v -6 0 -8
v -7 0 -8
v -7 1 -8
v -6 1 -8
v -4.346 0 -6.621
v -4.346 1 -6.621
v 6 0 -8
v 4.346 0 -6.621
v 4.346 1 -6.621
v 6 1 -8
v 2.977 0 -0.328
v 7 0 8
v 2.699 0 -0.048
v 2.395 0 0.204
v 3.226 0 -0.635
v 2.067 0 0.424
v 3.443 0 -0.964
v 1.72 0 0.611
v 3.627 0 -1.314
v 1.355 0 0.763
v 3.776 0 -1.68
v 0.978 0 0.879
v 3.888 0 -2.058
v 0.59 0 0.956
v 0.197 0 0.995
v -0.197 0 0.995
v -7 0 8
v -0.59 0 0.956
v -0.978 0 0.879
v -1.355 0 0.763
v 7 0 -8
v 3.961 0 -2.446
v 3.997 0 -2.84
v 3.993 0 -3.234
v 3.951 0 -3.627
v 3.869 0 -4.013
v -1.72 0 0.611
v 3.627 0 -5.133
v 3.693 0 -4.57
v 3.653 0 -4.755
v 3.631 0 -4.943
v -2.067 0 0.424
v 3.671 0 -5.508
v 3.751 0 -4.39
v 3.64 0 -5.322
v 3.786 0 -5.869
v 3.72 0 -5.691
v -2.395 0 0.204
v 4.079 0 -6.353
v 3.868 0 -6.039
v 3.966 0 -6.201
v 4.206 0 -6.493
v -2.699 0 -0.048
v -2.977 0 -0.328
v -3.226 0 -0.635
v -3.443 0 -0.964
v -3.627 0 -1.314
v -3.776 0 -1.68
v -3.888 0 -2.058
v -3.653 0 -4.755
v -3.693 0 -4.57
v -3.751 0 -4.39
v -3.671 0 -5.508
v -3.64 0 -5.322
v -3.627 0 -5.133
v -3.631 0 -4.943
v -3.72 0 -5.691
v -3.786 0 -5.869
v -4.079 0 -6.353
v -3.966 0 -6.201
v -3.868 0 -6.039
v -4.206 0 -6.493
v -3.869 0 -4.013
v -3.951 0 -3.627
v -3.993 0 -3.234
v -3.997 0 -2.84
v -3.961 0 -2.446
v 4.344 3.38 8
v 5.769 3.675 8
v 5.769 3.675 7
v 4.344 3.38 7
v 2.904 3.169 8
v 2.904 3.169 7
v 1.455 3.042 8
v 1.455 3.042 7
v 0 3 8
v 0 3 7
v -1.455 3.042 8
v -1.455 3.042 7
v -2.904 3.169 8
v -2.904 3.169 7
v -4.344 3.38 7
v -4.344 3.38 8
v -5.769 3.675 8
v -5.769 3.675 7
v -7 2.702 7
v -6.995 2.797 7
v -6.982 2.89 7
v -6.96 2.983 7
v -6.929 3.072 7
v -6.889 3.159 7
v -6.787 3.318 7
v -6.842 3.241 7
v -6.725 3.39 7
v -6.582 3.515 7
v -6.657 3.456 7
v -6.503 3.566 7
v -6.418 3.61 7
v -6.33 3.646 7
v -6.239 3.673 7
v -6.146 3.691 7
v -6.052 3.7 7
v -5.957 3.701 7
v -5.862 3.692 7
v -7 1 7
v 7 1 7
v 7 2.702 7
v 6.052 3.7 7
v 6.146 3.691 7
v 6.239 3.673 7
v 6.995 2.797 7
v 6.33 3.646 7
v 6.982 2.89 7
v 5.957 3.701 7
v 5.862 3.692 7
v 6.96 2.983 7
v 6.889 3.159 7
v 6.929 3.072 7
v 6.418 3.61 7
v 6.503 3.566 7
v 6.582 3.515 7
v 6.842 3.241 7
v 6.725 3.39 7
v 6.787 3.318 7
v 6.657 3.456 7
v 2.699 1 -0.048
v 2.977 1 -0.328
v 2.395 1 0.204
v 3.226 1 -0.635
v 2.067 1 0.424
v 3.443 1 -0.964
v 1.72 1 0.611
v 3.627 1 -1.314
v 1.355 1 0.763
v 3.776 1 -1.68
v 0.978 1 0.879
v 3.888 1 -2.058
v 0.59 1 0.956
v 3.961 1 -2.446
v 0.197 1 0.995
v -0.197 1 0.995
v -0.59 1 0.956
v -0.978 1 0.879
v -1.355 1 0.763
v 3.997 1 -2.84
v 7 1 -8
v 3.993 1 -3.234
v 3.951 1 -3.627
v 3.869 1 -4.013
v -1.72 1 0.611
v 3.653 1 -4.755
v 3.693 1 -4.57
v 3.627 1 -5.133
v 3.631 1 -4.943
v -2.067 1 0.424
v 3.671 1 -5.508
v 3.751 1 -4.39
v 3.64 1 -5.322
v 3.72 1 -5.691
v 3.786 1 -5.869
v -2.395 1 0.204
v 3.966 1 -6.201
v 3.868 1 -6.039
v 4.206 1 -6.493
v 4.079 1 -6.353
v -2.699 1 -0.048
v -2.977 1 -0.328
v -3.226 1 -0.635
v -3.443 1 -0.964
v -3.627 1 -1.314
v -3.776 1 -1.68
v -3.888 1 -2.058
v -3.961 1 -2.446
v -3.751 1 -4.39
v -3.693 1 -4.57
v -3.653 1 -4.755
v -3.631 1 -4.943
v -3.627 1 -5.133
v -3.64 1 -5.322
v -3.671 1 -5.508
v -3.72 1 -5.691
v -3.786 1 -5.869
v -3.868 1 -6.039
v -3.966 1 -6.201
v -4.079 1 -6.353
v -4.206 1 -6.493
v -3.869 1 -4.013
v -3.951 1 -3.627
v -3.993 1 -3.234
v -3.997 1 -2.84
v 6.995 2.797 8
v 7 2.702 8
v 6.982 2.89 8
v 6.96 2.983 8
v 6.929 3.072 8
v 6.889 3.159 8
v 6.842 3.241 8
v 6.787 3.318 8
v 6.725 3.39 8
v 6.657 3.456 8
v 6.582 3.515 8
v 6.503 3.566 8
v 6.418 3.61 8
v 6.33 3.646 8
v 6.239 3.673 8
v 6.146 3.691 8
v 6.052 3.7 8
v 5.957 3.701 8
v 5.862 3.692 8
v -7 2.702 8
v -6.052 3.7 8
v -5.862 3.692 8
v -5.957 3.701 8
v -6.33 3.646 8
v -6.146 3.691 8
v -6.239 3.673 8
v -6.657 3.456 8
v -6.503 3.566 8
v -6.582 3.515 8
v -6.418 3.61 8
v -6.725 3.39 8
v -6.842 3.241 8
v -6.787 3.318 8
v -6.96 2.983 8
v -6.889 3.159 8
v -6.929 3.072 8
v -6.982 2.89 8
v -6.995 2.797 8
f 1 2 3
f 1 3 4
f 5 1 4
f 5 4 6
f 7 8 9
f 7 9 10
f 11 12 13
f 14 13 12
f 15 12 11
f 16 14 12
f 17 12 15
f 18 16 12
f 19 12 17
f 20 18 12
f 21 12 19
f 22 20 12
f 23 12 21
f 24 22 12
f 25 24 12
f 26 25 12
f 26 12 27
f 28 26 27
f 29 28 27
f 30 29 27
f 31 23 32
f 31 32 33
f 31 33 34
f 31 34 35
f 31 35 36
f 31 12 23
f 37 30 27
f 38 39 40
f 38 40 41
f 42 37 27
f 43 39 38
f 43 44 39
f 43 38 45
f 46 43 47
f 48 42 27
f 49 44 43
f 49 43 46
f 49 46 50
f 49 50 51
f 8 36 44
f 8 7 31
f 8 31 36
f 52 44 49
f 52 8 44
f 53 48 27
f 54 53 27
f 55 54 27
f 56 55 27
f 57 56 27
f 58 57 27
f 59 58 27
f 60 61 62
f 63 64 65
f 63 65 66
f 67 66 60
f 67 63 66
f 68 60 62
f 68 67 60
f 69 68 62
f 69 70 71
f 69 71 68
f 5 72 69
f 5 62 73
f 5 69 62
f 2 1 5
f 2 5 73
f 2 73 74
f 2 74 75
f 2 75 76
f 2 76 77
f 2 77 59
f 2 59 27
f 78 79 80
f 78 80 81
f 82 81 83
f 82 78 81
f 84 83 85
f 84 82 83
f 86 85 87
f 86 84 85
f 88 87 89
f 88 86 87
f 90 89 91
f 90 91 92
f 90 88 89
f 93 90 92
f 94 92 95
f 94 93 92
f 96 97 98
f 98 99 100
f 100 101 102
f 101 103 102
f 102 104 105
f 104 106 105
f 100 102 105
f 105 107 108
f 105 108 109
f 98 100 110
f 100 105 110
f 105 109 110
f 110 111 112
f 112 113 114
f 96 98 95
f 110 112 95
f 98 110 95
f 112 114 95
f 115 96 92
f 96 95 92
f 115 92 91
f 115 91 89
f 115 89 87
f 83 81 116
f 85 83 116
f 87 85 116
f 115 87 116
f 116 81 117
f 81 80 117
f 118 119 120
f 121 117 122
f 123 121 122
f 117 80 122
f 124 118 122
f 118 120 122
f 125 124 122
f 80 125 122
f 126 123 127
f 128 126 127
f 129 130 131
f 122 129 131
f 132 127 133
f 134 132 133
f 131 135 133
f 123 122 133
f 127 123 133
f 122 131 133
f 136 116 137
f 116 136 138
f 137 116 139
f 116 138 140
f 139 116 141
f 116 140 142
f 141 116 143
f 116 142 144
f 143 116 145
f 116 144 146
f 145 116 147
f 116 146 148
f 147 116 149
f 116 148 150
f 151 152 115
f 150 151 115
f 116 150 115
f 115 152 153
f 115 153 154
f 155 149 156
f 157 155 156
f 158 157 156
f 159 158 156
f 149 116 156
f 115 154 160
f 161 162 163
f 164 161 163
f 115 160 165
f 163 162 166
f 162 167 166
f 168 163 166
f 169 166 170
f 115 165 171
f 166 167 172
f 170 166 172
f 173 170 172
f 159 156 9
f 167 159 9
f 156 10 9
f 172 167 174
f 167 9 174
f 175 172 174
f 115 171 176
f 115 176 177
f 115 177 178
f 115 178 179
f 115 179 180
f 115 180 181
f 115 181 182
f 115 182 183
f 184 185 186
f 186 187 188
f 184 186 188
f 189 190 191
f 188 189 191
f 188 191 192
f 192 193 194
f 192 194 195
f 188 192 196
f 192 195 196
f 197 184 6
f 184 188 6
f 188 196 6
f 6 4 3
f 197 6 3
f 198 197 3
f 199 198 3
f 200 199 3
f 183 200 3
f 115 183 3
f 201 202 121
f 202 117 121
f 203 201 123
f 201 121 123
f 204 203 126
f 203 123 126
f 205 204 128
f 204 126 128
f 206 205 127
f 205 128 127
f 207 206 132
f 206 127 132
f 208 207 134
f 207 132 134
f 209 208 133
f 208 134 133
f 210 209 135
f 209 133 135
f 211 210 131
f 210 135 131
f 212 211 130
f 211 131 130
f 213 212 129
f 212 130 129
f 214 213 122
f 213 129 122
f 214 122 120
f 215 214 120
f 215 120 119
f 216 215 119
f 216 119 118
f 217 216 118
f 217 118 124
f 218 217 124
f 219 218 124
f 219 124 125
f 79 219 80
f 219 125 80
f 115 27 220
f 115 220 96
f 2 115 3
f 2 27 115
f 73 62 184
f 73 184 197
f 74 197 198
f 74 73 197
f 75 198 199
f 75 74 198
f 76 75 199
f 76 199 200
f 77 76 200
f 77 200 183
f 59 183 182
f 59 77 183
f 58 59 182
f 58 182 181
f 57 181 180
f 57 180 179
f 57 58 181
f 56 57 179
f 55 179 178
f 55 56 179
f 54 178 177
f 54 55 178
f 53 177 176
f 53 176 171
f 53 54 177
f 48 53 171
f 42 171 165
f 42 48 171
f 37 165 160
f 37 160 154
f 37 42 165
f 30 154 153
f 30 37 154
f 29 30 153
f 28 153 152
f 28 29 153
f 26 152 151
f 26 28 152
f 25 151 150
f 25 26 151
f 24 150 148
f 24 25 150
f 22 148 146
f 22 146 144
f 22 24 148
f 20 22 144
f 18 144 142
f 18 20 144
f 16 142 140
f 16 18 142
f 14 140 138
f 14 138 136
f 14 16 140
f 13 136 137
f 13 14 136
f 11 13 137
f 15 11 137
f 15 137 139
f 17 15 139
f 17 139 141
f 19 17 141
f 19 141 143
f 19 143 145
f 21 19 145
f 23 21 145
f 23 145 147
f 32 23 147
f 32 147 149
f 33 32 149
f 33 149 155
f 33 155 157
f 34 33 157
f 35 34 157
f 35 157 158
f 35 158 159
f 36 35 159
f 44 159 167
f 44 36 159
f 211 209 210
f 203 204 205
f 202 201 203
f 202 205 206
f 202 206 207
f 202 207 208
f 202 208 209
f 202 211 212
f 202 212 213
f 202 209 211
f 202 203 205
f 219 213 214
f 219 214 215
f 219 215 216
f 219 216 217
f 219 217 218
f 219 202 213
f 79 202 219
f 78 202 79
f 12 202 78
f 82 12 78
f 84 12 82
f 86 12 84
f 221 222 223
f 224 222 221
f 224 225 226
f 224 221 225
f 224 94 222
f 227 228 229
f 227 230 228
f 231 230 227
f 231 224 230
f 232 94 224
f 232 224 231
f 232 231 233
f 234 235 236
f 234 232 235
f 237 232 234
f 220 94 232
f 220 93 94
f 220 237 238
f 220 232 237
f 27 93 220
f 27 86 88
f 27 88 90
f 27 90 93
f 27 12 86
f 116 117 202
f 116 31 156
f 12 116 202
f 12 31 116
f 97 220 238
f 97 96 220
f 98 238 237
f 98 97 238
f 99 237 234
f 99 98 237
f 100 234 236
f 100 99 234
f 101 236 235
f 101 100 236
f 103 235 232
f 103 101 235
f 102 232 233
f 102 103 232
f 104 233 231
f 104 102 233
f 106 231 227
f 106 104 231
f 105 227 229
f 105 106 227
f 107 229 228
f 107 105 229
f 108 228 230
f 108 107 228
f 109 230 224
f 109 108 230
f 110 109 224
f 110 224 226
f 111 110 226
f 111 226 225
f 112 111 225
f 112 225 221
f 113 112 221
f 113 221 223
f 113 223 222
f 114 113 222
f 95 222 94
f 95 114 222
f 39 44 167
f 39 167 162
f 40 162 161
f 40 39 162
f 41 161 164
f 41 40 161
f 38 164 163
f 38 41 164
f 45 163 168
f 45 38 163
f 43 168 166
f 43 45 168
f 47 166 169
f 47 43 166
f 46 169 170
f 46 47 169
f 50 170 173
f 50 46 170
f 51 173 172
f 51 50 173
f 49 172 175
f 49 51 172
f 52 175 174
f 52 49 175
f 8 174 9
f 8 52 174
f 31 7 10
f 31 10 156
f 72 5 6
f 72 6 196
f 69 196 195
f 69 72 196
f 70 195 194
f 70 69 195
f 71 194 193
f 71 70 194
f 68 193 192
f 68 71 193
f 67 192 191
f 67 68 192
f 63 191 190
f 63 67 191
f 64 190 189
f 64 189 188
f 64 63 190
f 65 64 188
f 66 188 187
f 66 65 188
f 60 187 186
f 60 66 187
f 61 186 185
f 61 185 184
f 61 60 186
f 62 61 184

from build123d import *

# Parameters (mm, degrees)
EXTRUDE1_DEPTH = 1
EXTRUDE2_DEPTH = 1
FILLET1_R      = 1


with BuildPart() as part:
    # Sketch1 → Extrude1 (new body)
    with BuildSketch(Plane(origin=(0, 0, 0), x_dir=(1, 0, 0), z_dir=(0, 1, 0))):
        with BuildLine():
            Line((-7, 8), (-6, 8))
            Line((-6, 8), (-4.34571581, 6.621429842))
            ThreePointArc((-4.34571581, 6.621429842), (-3.693602337, 5.600266108), (-3.750723073, 4.389991522))
            ThreePointArc((-3.750723073, 4.389991522), (0, -1), (3.750723073, 4.389991522))
            ThreePointArc((3.750723073, 4.389991522), (3.693602337, 5.600266108), (4.34571581, 6.621429842))
            Line((4.34571581, 6.621429842), (6, 8))
            Line((6, 8), (7, 8))
            Line((7, 8), (7, -8))
            Line((7, -8), (-7, -8))
            Line((-7, -8), (-7, 8))
        make_face()
    extrude(amount=EXTRUDE1_DEPTH)

    # Sketch2 → Extrude2 (add)
    with BuildSketch(Plane.XY.offset(8)):
        with BuildLine():
            Line((-7, 0), (7, 0))
            Line((7, 0), (7, 4))
            ThreePointArc((7, 4), (0, 3), (-7, 4))
            Line((-7, 4), (-7, 0))
        make_face()
    extrude(amount=-EXTRUDE2_DEPTH)

    # Fillet1
    fillet1_edges = [part.edges().sort_by_distance(p)[0] for p in [
        (-7, 4, 7.5),
        (7, 4, 7.5),
    ]]
    fillet(fillet1_edges, radius=FILLET1_R)


solid = part.part
